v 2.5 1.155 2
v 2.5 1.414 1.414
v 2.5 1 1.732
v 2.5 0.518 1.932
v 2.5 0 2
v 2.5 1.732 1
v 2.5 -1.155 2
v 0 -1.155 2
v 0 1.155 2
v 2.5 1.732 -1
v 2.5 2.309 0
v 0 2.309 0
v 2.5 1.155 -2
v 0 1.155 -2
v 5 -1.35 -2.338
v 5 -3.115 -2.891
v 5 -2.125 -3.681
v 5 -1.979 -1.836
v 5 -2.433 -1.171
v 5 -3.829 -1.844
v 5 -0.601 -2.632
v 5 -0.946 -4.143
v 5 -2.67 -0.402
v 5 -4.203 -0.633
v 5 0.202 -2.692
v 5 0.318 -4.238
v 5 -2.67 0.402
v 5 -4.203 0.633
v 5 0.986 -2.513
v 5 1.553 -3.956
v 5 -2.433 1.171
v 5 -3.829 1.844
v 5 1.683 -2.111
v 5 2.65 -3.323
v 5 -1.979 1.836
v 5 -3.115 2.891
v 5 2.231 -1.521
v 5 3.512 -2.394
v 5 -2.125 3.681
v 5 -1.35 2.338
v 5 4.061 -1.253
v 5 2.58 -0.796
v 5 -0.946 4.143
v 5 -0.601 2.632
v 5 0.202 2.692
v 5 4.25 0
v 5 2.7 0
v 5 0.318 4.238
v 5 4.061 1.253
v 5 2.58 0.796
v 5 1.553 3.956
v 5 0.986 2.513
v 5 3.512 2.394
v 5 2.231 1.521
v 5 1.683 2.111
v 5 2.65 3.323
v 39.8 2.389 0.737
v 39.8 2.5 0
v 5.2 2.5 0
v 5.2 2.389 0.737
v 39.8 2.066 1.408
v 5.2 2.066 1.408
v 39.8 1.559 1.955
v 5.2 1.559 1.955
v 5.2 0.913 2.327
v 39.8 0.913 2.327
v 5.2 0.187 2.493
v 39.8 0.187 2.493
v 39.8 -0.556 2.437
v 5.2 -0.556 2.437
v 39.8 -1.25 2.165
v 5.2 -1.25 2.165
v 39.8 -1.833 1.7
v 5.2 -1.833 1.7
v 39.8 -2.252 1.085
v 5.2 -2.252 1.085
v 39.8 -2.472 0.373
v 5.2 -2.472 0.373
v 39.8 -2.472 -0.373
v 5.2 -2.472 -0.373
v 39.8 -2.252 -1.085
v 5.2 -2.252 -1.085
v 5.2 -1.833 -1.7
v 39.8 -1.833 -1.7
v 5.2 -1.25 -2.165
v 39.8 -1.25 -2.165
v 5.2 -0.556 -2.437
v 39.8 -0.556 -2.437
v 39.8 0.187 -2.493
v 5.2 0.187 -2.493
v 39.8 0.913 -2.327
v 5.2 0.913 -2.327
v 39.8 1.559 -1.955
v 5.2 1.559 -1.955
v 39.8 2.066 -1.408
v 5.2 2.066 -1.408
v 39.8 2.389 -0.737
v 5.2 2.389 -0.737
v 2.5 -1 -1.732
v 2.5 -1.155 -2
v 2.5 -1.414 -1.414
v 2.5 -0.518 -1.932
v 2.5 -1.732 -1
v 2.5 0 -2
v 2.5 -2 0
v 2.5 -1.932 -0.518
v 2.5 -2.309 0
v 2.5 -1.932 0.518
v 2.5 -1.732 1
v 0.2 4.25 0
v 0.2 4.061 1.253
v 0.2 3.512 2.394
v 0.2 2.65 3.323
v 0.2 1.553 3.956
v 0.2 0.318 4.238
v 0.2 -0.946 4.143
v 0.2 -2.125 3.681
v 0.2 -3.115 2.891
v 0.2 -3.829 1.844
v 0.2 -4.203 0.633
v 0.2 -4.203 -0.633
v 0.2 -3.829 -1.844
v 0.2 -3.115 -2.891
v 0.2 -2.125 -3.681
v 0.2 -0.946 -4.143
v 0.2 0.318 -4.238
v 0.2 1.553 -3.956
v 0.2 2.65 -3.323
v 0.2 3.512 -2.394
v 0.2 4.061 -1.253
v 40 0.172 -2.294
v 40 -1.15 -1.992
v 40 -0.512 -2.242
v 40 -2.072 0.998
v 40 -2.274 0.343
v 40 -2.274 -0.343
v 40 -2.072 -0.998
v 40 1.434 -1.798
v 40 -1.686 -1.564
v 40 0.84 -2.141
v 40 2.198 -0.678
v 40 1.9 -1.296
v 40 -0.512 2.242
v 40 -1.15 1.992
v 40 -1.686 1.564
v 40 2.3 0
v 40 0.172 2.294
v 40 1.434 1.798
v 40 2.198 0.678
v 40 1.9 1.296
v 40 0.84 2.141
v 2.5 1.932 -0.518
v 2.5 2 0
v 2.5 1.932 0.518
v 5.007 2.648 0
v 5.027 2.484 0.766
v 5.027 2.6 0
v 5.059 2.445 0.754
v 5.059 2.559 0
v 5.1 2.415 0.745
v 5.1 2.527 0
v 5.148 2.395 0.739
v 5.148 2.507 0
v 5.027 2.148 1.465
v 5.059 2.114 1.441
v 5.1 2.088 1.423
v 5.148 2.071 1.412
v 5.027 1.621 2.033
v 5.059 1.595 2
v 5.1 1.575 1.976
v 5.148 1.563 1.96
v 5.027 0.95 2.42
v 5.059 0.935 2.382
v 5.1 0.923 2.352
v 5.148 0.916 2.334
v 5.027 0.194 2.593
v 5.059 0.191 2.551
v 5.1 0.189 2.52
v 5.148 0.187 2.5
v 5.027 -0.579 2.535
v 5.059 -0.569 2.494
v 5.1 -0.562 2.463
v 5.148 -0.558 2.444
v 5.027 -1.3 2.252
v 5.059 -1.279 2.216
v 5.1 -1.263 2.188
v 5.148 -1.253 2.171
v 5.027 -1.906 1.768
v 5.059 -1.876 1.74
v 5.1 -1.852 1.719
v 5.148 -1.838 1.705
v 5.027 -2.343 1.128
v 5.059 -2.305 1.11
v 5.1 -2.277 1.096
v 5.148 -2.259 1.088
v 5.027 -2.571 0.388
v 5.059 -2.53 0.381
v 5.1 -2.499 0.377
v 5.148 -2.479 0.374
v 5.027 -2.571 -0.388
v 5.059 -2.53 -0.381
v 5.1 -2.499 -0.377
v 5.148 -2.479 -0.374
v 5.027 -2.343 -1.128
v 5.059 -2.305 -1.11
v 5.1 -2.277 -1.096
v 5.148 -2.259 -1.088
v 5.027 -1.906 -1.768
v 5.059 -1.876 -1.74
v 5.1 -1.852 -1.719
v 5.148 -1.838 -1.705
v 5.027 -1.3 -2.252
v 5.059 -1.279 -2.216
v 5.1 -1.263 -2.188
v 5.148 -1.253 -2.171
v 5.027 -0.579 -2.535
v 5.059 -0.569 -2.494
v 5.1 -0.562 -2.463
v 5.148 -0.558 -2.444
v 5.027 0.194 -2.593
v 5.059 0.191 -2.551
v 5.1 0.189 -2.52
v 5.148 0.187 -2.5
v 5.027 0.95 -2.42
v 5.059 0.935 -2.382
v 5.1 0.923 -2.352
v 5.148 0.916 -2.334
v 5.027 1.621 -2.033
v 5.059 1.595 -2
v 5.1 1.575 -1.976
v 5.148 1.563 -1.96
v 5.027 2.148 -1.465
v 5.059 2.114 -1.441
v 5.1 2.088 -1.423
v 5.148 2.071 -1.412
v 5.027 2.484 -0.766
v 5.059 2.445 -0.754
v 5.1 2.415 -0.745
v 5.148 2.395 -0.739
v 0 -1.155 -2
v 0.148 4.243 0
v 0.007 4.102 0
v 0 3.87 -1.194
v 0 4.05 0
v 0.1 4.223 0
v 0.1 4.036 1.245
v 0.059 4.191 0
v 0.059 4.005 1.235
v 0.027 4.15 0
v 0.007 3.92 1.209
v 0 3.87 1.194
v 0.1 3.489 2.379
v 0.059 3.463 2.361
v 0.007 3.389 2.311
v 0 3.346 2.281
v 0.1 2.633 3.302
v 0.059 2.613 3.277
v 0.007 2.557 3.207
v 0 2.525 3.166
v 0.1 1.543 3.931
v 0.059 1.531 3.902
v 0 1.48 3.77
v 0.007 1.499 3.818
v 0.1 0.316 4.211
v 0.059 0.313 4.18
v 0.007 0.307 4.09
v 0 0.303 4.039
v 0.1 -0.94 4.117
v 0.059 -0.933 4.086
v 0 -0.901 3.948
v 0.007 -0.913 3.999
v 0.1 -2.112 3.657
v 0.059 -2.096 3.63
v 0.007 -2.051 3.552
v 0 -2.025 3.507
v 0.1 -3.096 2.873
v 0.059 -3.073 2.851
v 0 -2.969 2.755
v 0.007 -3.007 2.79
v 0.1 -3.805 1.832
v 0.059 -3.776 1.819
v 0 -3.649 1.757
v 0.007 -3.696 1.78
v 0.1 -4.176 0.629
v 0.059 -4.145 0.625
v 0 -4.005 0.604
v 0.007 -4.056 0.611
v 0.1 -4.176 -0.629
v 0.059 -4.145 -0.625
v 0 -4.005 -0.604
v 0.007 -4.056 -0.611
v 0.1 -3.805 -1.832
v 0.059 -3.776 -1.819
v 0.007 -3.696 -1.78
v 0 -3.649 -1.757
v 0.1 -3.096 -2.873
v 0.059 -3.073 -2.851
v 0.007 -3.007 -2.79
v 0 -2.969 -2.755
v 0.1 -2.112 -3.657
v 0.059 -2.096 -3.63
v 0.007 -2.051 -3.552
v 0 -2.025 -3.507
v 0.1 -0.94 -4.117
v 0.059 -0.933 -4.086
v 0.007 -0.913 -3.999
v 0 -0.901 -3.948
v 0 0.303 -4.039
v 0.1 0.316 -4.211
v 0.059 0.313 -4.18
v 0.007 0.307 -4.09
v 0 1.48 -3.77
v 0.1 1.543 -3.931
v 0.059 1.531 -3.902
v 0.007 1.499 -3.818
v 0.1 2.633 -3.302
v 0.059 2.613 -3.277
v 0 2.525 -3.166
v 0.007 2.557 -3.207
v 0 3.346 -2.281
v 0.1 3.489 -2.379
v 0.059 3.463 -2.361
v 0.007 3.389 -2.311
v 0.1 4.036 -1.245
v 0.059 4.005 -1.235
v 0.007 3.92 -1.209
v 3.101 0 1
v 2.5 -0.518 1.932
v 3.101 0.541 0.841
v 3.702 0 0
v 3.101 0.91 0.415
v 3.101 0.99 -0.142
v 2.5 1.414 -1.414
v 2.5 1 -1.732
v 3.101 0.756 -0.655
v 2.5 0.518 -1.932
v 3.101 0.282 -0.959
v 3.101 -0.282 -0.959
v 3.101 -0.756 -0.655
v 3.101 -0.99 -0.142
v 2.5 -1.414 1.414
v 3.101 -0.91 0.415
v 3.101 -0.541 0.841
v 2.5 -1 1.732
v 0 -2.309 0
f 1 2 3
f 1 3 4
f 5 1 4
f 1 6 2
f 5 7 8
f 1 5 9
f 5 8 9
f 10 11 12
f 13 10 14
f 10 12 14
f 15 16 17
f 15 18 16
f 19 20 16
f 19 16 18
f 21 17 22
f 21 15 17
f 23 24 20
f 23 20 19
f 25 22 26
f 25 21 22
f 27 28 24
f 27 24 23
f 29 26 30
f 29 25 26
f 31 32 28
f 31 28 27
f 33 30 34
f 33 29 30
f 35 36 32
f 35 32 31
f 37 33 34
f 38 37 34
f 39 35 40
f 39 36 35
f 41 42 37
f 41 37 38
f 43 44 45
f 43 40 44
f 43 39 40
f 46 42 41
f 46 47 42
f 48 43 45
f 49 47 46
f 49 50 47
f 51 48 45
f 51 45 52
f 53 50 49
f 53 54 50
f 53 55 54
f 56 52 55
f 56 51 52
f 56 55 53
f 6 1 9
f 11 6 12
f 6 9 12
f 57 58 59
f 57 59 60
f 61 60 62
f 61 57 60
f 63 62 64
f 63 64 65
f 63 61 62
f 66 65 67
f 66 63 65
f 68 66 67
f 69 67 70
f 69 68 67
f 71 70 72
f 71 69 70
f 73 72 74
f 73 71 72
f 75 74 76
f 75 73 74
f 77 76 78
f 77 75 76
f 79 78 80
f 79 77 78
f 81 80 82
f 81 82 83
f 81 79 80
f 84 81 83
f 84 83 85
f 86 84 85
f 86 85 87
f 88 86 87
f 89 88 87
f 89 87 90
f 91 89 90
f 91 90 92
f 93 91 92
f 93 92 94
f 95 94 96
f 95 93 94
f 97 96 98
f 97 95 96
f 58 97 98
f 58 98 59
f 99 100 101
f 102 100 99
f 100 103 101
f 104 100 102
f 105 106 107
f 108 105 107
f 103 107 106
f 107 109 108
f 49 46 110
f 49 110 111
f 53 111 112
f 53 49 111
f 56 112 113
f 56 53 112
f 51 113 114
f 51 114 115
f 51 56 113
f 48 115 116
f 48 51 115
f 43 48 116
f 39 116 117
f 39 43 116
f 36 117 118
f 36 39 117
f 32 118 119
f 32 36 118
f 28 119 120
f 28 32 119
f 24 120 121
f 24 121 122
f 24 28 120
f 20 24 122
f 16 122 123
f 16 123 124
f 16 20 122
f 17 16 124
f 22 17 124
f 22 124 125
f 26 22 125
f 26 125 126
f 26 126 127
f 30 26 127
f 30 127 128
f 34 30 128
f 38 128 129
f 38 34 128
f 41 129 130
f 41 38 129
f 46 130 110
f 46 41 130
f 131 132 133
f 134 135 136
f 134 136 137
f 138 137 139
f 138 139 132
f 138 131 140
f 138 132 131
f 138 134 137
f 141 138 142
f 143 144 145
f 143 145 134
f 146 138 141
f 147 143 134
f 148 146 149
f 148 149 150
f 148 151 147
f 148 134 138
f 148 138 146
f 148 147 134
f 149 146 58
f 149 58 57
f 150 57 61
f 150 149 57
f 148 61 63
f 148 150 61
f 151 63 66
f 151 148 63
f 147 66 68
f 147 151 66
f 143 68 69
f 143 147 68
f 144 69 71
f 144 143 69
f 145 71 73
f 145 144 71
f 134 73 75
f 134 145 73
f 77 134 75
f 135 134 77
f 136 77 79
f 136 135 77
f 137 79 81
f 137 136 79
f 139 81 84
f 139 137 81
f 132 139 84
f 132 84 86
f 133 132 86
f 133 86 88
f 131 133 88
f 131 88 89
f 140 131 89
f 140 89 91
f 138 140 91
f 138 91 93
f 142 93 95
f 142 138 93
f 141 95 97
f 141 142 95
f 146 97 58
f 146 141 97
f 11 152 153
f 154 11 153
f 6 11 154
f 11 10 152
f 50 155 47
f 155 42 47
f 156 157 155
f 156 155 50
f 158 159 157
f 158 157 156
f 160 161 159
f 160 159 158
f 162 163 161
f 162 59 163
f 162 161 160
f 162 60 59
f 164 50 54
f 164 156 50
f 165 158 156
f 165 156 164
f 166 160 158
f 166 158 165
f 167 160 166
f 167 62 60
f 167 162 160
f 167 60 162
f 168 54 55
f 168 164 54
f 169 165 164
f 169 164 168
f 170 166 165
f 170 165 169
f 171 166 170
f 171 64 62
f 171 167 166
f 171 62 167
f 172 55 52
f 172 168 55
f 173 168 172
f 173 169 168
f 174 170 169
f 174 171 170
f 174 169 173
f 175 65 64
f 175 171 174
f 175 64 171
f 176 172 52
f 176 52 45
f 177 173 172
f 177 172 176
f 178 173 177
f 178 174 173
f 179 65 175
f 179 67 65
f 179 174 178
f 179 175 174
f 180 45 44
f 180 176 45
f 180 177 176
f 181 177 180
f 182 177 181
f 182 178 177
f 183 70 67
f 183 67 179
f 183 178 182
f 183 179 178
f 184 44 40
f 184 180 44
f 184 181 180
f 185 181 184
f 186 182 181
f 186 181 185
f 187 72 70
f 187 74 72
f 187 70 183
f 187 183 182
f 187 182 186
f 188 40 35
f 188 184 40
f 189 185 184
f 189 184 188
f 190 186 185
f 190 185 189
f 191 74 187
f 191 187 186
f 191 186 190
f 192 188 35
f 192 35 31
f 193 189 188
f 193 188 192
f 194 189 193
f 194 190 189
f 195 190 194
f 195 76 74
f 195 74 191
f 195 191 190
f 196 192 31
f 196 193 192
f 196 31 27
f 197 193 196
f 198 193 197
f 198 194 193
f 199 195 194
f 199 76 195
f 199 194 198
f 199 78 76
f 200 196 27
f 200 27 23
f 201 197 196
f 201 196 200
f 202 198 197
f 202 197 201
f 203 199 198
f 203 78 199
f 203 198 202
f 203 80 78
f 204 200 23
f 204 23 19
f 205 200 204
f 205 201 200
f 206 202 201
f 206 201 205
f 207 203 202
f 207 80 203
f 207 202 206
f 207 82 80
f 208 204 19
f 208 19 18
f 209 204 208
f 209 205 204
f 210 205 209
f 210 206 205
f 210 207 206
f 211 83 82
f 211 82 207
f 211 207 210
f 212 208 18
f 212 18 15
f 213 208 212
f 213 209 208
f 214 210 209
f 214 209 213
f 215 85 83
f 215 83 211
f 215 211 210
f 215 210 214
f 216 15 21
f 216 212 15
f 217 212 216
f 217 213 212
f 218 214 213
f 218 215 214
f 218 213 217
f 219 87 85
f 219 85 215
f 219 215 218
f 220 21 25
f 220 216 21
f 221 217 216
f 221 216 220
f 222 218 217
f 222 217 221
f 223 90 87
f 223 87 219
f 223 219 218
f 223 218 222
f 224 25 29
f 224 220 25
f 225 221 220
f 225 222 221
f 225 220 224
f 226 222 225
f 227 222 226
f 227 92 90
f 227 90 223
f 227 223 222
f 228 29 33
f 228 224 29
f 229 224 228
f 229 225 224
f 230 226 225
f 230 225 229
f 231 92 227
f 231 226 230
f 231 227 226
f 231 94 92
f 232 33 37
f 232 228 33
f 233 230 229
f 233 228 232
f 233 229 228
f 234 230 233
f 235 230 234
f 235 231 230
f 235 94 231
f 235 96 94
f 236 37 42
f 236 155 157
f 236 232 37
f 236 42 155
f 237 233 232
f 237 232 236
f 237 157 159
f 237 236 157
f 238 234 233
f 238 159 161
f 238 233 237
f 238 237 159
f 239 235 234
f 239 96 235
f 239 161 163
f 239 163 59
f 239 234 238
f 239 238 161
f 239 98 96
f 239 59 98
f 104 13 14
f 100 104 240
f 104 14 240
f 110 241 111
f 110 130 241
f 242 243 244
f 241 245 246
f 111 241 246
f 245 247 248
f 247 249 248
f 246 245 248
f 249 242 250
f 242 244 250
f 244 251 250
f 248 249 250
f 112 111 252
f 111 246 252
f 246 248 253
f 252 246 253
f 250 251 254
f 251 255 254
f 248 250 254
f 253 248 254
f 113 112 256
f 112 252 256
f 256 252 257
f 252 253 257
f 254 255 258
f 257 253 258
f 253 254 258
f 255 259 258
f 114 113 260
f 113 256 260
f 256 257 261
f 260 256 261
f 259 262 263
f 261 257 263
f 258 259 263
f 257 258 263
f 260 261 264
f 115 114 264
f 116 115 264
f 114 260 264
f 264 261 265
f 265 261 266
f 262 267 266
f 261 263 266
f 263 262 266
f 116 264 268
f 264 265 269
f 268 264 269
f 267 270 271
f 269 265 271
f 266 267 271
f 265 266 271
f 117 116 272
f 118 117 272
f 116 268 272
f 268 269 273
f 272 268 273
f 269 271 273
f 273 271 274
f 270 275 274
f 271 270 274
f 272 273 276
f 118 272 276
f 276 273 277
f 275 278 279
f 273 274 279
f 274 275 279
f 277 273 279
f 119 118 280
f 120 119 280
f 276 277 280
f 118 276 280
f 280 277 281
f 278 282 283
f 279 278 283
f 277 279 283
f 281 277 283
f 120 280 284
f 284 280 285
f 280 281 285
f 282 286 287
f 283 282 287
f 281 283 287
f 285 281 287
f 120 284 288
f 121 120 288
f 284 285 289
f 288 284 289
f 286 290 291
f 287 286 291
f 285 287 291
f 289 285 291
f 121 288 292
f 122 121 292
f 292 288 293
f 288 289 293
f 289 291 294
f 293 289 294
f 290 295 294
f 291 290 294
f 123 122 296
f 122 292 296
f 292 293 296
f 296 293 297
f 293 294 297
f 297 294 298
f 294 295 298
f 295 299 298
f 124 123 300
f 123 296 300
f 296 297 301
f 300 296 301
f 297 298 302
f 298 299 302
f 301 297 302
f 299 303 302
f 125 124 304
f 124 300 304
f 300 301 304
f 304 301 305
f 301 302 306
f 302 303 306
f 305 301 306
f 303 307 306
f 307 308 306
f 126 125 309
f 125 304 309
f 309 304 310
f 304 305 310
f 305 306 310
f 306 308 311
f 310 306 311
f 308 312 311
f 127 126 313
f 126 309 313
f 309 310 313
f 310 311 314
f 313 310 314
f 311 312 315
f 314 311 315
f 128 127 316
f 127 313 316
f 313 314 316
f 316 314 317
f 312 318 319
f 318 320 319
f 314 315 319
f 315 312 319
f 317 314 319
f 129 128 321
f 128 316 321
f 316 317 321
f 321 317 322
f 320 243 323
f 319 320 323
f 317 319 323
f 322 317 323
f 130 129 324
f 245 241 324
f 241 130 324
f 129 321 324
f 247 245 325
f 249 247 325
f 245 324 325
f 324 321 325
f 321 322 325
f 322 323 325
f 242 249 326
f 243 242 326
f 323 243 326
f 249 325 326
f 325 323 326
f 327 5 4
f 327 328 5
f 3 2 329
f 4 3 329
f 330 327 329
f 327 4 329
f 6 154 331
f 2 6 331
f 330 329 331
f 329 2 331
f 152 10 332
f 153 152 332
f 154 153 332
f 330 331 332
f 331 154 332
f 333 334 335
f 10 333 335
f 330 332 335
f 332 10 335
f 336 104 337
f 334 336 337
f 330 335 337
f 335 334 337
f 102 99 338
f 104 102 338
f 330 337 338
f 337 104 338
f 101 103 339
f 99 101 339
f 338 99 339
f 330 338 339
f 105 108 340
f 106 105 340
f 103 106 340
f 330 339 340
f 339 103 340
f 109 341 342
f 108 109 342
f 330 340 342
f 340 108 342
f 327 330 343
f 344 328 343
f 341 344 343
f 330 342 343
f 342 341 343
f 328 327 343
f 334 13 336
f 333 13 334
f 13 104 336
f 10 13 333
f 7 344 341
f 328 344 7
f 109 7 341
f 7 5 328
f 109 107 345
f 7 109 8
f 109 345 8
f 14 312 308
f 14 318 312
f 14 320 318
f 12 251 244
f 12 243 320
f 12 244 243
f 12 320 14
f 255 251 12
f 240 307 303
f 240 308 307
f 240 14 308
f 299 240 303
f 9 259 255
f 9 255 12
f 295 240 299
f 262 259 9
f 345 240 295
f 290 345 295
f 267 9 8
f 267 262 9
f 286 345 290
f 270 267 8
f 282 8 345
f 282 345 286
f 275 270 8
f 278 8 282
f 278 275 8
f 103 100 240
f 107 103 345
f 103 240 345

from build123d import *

# Parameters (mm, degrees)
CHAMFER_1_SIZE            = 0.2
FILLET_1_R                = 0.2
HOLE_WIZARD_4_0_4_1_D     = 4
HOLE_WIZARD_4_0_4_1_DEPTH = 2.5
HOLE_WIZARD_4_0_4_1_TIP   = 1.201721238
CUT_EXTRUDE_1_DEPTH       = 2.5
FILLET_2_R                = 0.2


with BuildPart() as part:
    # 草图1 → 旋转1 (revolve)
    with BuildSketch(Plane.XY):
        Polygon((0, 0), (0, 4.25), (5, 4.25), (5, 2.5), (40, 2.5), (40, 0), align=None)
    revolve(axis=Axis((0, 0, 0), (1, 0, 0)))

    # 倒角1
    chamfer_1_edges = [part.edges().sort_by_distance(p)[0] for p in [
        (40, -2.5, 0),
    ]]
    chamfer(chamfer_1_edges, length=CHAMFER_1_SIZE)

    # 圆角1
    fillet_1_edges = [part.edges().sort_by_distance(p)[0] for p in [
        (0, -4.25, 0),
    ]]
    fillet(fillet_1_edges, radius=FILLET_1_R)

    # Ø4.0 (4) 直径孔1
    with Locations(Plane.ZY):
        with Locations((0, 0)):
            Hole(HOLE_WIZARD_4_0_4_1_D / 2, depth=HOLE_WIZARD_4_0_4_1_DEPTH)
            with Locations((0, 0, -(HOLE_WIZARD_4_0_4_1_DEPTH + HOLE_WIZARD_4_0_4_1_TIP / 2))):  # 118° drill point
                Cone(0, HOLE_WIZARD_4_0_4_1_D / 2, HOLE_WIZARD_4_0_4_1_TIP, mode=Mode.SUBTRACT)

    # 草图2 → 切除-拉伸1 (cut)
    with BuildSketch(Plane.ZY):
        Polygon((0, -2.309401077), (2, -1.154700538), (2, 1.154700538), (0, 2.309401077), (-2, 1.154700538), (-2, -1.154700538), align=None)
    extrude(amount=-CUT_EXTRUDE_1_DEPTH, mode=Mode.SUBTRACT)

    # 圆角2
    fillet_2_edges = [part.edges().sort_by_distance(p)[0] for p in [
        (5, -2.5, 0),
    ]]
    fillet(fillet_2_edges, radius=FILLET_2_R)


solid = part.part
